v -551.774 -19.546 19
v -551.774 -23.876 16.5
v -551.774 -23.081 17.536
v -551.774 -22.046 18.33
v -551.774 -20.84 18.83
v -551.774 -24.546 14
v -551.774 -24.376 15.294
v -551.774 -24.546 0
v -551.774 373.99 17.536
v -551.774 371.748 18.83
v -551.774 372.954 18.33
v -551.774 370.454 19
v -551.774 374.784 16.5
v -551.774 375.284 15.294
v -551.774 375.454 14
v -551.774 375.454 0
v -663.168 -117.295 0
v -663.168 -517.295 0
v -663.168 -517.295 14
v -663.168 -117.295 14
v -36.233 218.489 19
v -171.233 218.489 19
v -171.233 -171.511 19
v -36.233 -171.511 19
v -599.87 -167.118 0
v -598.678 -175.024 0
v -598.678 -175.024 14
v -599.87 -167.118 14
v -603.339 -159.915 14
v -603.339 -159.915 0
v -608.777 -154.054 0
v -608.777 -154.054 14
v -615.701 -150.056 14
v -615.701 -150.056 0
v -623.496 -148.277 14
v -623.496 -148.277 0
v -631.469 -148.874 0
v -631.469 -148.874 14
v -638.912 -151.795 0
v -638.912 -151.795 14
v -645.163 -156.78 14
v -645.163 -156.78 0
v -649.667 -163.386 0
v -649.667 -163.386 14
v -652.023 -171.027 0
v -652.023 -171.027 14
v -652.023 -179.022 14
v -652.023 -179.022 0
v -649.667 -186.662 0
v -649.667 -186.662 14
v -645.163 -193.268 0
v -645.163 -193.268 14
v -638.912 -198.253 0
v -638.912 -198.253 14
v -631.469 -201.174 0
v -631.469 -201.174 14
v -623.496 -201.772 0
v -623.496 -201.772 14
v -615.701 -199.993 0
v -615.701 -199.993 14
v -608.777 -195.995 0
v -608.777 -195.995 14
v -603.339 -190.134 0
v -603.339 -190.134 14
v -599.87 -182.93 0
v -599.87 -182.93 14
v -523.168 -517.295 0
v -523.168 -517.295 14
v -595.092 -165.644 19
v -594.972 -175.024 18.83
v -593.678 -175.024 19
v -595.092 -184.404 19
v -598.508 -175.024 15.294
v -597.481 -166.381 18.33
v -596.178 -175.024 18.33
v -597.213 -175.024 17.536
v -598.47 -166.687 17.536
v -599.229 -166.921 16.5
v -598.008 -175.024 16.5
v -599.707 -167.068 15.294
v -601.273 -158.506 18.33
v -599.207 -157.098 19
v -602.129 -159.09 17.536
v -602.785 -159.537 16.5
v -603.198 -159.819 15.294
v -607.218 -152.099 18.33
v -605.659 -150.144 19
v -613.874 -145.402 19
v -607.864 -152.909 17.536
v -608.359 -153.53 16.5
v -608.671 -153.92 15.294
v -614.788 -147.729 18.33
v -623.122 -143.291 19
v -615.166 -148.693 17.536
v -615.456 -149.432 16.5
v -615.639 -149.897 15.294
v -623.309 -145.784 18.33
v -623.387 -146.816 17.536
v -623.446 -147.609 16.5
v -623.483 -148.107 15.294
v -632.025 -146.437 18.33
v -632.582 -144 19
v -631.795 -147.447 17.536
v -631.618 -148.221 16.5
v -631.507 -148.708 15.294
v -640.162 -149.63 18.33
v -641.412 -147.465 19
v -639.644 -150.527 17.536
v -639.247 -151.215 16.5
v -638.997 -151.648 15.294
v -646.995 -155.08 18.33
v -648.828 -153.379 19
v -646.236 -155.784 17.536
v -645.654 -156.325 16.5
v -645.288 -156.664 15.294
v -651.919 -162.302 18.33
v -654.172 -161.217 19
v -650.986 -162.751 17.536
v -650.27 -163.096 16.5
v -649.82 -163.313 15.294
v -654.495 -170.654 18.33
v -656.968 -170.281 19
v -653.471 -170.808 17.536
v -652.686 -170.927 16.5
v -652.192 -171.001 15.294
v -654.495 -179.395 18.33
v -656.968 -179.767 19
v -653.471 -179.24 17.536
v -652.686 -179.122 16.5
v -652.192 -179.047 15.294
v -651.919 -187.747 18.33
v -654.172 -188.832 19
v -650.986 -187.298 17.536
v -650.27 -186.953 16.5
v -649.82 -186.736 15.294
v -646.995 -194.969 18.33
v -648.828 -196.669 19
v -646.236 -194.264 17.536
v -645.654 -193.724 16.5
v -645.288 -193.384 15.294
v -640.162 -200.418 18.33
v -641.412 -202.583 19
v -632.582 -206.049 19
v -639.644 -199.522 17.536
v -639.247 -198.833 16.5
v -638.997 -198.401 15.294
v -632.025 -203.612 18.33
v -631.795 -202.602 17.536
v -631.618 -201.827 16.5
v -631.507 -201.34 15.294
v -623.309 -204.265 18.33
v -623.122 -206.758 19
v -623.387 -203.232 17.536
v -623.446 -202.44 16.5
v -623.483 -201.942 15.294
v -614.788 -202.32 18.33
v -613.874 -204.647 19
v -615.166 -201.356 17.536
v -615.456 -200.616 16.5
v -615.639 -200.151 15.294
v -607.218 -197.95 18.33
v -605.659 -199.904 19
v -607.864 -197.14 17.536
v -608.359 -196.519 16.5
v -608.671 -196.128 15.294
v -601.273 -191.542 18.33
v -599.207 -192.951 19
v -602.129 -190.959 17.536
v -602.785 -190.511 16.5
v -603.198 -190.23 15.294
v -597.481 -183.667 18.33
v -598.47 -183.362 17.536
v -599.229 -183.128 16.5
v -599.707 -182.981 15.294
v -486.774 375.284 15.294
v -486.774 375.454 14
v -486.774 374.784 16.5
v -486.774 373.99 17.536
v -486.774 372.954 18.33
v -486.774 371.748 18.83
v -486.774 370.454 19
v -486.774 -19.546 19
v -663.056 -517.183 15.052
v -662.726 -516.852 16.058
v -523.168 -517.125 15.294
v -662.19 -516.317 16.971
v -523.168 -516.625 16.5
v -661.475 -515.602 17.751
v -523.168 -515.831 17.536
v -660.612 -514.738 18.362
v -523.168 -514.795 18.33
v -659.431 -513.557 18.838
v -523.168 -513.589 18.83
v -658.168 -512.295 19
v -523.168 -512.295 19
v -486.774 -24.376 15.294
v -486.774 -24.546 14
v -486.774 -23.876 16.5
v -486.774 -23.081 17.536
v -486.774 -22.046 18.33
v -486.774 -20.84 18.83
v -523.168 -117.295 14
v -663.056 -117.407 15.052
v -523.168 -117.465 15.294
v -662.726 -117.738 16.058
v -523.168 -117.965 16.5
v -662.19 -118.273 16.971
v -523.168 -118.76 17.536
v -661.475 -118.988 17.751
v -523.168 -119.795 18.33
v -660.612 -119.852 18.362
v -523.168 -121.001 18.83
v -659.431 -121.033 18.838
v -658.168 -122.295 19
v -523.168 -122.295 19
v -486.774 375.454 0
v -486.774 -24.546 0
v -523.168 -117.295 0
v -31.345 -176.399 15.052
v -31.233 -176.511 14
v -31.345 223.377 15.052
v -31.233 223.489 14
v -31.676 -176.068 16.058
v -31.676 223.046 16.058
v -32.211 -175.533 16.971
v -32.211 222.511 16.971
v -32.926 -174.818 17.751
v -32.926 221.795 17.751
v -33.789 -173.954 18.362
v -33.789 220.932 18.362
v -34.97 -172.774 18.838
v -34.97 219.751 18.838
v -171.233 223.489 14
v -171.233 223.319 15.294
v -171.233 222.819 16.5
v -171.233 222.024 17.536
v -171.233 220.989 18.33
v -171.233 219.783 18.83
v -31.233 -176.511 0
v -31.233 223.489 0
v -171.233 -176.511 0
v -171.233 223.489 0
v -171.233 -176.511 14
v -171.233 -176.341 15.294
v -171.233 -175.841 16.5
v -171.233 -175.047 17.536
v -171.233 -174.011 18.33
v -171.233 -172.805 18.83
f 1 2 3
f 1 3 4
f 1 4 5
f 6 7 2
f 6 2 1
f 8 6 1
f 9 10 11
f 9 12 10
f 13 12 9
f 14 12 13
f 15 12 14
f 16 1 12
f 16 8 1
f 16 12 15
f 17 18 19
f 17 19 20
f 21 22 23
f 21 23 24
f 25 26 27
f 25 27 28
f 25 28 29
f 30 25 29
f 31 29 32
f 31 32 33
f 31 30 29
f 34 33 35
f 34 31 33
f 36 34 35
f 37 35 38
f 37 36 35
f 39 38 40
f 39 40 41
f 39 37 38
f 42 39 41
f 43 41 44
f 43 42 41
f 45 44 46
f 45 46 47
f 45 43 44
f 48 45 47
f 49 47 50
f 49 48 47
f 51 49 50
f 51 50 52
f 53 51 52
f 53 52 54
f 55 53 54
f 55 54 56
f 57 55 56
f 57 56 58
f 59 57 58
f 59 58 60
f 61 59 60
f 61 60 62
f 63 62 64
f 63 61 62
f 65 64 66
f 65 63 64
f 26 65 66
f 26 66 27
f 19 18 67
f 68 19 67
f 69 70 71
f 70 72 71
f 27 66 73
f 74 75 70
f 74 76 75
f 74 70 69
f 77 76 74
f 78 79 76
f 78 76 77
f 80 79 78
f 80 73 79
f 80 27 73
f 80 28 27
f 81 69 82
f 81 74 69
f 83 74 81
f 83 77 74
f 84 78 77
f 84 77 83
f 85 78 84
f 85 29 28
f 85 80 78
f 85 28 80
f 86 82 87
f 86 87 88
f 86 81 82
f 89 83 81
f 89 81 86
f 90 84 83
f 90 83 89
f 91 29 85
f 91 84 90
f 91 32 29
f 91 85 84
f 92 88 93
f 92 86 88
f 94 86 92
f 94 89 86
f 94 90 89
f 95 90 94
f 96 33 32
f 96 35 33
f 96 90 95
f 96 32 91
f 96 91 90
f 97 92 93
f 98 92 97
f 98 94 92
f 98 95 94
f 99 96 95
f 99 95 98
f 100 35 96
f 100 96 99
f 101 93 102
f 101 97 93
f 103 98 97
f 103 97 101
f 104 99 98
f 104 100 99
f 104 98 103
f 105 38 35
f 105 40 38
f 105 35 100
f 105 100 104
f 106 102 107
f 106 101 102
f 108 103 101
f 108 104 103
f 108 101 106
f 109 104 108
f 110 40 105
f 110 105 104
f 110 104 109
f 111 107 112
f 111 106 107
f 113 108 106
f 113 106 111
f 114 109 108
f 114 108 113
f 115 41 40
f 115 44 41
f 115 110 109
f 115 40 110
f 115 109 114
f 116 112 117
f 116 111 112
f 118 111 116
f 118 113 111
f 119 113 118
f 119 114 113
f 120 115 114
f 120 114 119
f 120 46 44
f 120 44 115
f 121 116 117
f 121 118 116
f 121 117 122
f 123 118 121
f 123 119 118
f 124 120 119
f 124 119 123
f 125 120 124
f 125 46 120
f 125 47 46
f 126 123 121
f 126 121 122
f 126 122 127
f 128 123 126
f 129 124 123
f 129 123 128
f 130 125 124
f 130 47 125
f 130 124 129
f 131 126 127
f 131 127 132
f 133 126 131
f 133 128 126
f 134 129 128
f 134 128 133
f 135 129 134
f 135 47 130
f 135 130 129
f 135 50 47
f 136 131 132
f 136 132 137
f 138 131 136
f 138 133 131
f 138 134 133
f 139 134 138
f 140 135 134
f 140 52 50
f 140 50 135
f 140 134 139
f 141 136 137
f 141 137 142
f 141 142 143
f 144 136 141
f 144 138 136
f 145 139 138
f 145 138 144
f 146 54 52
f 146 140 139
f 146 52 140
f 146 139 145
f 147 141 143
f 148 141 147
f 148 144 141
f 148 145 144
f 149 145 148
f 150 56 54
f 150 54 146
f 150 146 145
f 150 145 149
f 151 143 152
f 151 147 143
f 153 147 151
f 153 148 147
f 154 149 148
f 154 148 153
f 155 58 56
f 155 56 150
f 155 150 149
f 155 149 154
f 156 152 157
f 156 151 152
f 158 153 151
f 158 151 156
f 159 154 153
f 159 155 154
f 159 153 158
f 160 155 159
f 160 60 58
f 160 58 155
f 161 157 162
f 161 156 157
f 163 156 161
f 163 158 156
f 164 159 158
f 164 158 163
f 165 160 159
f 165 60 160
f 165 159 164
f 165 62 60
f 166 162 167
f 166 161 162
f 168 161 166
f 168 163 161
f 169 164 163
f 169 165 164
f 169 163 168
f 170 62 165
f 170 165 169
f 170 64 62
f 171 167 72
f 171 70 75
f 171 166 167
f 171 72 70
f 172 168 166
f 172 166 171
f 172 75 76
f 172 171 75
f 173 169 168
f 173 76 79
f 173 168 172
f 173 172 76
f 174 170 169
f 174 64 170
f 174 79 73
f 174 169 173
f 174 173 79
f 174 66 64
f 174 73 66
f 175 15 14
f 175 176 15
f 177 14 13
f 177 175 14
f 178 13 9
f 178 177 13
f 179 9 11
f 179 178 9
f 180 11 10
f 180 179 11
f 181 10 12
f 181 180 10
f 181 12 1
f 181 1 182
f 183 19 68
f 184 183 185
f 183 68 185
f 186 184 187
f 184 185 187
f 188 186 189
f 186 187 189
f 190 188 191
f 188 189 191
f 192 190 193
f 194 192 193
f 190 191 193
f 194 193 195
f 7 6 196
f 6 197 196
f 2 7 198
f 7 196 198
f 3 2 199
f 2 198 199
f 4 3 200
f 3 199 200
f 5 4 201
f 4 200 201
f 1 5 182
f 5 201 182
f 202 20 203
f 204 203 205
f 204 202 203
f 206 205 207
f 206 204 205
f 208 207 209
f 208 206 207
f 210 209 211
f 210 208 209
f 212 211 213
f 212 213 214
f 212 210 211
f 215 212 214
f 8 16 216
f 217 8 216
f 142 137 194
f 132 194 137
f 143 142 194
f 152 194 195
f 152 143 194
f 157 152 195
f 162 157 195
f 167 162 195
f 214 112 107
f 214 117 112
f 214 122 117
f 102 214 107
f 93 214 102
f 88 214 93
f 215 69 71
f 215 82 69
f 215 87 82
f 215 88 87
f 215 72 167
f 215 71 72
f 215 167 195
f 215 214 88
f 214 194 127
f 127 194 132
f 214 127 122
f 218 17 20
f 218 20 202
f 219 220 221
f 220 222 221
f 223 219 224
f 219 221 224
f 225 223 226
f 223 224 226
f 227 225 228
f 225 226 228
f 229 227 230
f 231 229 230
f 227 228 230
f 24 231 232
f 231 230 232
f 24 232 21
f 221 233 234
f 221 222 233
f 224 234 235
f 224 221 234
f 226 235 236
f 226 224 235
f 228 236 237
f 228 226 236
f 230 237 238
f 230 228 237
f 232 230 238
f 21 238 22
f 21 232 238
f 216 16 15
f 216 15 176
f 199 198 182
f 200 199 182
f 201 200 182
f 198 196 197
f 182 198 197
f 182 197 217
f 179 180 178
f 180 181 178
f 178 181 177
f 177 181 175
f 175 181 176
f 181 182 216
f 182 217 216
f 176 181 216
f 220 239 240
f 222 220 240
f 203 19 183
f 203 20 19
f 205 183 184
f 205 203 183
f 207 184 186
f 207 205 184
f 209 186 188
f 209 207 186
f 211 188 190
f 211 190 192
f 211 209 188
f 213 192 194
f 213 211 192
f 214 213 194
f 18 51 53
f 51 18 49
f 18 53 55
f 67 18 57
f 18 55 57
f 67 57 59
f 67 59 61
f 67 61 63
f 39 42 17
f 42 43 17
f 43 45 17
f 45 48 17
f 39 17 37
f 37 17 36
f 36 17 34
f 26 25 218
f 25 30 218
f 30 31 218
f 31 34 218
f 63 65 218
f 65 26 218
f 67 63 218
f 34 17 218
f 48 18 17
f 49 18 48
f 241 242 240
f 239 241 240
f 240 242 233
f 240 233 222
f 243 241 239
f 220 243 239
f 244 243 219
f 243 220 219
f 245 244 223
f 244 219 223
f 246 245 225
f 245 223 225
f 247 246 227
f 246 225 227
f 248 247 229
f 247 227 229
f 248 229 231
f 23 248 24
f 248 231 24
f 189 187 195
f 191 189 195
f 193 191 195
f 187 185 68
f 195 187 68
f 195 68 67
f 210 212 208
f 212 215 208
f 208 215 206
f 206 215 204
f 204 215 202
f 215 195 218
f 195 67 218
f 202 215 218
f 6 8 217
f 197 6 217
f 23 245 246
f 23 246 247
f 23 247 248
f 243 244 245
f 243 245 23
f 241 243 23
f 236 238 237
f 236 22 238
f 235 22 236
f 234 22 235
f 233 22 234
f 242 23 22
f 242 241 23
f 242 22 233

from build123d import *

# Parameters (mm, degrees)
F0_W     = 140
F0_H     = 400
F1_DEPTH = 19
F2_W     = 65
F2_H     = 400
F3_DEPTH = 19
F4_W     = 140
F4_H     = 400
F4_R     = 26.82253
F5_DEPTH = 19
F6_R     = 5
F6_2_R   = 5
F6_3_R   = 5
F7_R     = 5


with BuildPart() as f1:
    # F0 (on Top) → F1 (new body)
    with BuildSketch(Plane.XY):
        with Locations((-101.23252, 23.488902)):
            Rectangle(F0_W, F0_H)
    extrude(amount=F1_DEPTH)

    # F6#3
    f6_3_edges = [f1.edges().sort_by_distance(p)[0] for p in [
        (-101.23252, -176.511098, 19),
        (-31.23252, 23.488902, 19),
        (-101.23252, 223.488902, 19),
    ]]
    fillet(f6_3_edges, radius=F6_3_R)


with BuildPart() as f3:
    # F2 (on Top) → F3 (new body)
    with BuildSketch(Plane.XY):
        with Locations((-519.274324, 175.454074)):
            Rectangle(F2_W, F2_H)
    extrude(amount=F3_DEPTH)

    # F6#2
    f6_2_edges = [f3.edges().sort_by_distance(p)[0] for p in [
        (-519.274324, -24.545926, 19),
        (-519.274324, 375.454074, 19),
    ]]
    fillet(f6_2_edges, radius=F6_2_R)


with BuildPart() as f5:
    # F4 (on Top) → F5 (new body)
    with BuildSketch(Plane.XY):
        with Locations((-593.168492, -317.295037)):
            Rectangle(F4_W, F4_H)
        with Locations((-625.500441, -175.024316)):
            Circle(F4_R, mode=Mode.SUBTRACT)
    extrude(amount=F5_DEPTH)

    # F6
    f6_edges = [f5.edges().sort_by_distance(p)[0] for p in [
        (-663.168492, -317.295037, 19),
        (-593.168492, -517.295037, 19),
        (-593.168492, -117.295037, 19),
    ]]
    fillet(f6_edges, radius=F6_R)

    # F7
    f7_edges = [f5.edges().sort_by_distance(p)[0] for p in [
        (-652.32297, -175.024316, 19),
    ]]
    fillet(f7_edges, radius=F7_R)


solid = Compound([f1.part, f3.part, f5.part])
